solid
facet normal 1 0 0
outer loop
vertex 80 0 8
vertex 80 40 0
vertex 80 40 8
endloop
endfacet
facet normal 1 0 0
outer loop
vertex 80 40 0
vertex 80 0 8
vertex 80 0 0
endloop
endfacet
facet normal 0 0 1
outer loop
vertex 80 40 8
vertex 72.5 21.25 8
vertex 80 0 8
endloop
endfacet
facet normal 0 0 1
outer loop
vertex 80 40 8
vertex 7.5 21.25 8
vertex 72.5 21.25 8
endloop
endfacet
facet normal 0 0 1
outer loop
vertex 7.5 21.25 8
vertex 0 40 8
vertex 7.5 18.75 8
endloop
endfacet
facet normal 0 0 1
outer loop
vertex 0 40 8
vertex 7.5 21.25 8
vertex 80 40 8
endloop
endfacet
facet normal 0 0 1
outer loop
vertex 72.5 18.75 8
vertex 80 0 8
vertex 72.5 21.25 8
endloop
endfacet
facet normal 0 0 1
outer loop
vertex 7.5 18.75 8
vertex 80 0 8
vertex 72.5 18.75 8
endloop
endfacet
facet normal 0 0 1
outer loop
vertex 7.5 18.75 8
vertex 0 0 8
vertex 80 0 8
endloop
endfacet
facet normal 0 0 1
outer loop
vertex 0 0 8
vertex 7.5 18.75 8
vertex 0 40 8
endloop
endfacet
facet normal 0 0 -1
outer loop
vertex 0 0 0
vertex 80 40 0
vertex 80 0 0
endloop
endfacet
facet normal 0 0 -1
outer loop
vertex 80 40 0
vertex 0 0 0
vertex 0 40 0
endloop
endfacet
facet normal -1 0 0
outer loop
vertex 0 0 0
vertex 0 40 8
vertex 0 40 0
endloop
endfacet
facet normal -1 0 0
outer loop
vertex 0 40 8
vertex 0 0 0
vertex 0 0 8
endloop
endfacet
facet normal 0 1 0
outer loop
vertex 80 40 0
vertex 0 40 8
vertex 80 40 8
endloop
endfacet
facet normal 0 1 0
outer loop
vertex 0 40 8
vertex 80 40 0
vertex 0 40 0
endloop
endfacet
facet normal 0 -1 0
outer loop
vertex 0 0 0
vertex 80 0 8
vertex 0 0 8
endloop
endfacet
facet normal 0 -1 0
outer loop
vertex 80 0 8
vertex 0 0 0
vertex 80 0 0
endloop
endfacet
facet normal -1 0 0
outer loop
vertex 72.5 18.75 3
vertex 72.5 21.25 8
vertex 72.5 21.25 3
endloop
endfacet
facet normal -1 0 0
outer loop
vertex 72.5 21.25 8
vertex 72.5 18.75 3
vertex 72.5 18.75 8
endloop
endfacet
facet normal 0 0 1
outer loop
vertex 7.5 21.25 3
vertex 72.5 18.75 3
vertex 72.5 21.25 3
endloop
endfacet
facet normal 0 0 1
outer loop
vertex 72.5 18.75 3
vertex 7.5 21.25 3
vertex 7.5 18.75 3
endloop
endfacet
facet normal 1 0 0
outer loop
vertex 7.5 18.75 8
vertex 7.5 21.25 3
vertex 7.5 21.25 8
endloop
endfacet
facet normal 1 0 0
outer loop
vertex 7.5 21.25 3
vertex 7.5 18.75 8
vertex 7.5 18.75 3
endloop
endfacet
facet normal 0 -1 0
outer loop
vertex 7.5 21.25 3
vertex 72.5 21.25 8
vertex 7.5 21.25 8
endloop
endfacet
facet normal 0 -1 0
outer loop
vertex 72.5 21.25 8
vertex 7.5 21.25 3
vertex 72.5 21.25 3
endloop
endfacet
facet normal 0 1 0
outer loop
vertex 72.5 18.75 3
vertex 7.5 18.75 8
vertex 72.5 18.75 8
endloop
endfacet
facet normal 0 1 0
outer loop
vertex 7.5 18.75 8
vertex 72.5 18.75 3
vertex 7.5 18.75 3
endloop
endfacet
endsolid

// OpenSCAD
// CodeBound non-load-bearing tabletop label holder, millimeters.
// Use only in a dry indoor setting for paper/card labels.
// NOT for electrical, structural, pressure, food or potable-water applications.
// 3D printers may emit particles/VOCs and have hot and moving parts.
// Consult NIOSH and printer/filament manufacturer for ventilation and handling.
base_width_mm = 80;
base_depth_mm = 40;
base_height_mm = 8;
slot_width_mm = 2.5;
slot_length_mm = 65;
slot_depth_mm = 5;

assert(base_width_mm > slot_length_mm + 8, "Leave side walls");
assert(base_depth_mm > slot_width_mm + 8, "Leave front/back walls");
assert(base_height_mm > slot_depth_mm + 2, "Leave a floor under the slot");
assert(slot_length_mm > 15 && slot_width_mm > 0 && slot_depth_mm > 0);
difference() {
    cube([base_width_mm, base_depth_mm, base_height_mm], center = false);
    translate([(base_width_mm - slot_length_mm) / 2,
               (base_depth_mm - slot_width_mm) / 2,
               base_height_mm - slot_depth_mm])
        cube([slot_length_mm, slot_width_mm, slot_depth_mm + 0.1], center = false);
}
